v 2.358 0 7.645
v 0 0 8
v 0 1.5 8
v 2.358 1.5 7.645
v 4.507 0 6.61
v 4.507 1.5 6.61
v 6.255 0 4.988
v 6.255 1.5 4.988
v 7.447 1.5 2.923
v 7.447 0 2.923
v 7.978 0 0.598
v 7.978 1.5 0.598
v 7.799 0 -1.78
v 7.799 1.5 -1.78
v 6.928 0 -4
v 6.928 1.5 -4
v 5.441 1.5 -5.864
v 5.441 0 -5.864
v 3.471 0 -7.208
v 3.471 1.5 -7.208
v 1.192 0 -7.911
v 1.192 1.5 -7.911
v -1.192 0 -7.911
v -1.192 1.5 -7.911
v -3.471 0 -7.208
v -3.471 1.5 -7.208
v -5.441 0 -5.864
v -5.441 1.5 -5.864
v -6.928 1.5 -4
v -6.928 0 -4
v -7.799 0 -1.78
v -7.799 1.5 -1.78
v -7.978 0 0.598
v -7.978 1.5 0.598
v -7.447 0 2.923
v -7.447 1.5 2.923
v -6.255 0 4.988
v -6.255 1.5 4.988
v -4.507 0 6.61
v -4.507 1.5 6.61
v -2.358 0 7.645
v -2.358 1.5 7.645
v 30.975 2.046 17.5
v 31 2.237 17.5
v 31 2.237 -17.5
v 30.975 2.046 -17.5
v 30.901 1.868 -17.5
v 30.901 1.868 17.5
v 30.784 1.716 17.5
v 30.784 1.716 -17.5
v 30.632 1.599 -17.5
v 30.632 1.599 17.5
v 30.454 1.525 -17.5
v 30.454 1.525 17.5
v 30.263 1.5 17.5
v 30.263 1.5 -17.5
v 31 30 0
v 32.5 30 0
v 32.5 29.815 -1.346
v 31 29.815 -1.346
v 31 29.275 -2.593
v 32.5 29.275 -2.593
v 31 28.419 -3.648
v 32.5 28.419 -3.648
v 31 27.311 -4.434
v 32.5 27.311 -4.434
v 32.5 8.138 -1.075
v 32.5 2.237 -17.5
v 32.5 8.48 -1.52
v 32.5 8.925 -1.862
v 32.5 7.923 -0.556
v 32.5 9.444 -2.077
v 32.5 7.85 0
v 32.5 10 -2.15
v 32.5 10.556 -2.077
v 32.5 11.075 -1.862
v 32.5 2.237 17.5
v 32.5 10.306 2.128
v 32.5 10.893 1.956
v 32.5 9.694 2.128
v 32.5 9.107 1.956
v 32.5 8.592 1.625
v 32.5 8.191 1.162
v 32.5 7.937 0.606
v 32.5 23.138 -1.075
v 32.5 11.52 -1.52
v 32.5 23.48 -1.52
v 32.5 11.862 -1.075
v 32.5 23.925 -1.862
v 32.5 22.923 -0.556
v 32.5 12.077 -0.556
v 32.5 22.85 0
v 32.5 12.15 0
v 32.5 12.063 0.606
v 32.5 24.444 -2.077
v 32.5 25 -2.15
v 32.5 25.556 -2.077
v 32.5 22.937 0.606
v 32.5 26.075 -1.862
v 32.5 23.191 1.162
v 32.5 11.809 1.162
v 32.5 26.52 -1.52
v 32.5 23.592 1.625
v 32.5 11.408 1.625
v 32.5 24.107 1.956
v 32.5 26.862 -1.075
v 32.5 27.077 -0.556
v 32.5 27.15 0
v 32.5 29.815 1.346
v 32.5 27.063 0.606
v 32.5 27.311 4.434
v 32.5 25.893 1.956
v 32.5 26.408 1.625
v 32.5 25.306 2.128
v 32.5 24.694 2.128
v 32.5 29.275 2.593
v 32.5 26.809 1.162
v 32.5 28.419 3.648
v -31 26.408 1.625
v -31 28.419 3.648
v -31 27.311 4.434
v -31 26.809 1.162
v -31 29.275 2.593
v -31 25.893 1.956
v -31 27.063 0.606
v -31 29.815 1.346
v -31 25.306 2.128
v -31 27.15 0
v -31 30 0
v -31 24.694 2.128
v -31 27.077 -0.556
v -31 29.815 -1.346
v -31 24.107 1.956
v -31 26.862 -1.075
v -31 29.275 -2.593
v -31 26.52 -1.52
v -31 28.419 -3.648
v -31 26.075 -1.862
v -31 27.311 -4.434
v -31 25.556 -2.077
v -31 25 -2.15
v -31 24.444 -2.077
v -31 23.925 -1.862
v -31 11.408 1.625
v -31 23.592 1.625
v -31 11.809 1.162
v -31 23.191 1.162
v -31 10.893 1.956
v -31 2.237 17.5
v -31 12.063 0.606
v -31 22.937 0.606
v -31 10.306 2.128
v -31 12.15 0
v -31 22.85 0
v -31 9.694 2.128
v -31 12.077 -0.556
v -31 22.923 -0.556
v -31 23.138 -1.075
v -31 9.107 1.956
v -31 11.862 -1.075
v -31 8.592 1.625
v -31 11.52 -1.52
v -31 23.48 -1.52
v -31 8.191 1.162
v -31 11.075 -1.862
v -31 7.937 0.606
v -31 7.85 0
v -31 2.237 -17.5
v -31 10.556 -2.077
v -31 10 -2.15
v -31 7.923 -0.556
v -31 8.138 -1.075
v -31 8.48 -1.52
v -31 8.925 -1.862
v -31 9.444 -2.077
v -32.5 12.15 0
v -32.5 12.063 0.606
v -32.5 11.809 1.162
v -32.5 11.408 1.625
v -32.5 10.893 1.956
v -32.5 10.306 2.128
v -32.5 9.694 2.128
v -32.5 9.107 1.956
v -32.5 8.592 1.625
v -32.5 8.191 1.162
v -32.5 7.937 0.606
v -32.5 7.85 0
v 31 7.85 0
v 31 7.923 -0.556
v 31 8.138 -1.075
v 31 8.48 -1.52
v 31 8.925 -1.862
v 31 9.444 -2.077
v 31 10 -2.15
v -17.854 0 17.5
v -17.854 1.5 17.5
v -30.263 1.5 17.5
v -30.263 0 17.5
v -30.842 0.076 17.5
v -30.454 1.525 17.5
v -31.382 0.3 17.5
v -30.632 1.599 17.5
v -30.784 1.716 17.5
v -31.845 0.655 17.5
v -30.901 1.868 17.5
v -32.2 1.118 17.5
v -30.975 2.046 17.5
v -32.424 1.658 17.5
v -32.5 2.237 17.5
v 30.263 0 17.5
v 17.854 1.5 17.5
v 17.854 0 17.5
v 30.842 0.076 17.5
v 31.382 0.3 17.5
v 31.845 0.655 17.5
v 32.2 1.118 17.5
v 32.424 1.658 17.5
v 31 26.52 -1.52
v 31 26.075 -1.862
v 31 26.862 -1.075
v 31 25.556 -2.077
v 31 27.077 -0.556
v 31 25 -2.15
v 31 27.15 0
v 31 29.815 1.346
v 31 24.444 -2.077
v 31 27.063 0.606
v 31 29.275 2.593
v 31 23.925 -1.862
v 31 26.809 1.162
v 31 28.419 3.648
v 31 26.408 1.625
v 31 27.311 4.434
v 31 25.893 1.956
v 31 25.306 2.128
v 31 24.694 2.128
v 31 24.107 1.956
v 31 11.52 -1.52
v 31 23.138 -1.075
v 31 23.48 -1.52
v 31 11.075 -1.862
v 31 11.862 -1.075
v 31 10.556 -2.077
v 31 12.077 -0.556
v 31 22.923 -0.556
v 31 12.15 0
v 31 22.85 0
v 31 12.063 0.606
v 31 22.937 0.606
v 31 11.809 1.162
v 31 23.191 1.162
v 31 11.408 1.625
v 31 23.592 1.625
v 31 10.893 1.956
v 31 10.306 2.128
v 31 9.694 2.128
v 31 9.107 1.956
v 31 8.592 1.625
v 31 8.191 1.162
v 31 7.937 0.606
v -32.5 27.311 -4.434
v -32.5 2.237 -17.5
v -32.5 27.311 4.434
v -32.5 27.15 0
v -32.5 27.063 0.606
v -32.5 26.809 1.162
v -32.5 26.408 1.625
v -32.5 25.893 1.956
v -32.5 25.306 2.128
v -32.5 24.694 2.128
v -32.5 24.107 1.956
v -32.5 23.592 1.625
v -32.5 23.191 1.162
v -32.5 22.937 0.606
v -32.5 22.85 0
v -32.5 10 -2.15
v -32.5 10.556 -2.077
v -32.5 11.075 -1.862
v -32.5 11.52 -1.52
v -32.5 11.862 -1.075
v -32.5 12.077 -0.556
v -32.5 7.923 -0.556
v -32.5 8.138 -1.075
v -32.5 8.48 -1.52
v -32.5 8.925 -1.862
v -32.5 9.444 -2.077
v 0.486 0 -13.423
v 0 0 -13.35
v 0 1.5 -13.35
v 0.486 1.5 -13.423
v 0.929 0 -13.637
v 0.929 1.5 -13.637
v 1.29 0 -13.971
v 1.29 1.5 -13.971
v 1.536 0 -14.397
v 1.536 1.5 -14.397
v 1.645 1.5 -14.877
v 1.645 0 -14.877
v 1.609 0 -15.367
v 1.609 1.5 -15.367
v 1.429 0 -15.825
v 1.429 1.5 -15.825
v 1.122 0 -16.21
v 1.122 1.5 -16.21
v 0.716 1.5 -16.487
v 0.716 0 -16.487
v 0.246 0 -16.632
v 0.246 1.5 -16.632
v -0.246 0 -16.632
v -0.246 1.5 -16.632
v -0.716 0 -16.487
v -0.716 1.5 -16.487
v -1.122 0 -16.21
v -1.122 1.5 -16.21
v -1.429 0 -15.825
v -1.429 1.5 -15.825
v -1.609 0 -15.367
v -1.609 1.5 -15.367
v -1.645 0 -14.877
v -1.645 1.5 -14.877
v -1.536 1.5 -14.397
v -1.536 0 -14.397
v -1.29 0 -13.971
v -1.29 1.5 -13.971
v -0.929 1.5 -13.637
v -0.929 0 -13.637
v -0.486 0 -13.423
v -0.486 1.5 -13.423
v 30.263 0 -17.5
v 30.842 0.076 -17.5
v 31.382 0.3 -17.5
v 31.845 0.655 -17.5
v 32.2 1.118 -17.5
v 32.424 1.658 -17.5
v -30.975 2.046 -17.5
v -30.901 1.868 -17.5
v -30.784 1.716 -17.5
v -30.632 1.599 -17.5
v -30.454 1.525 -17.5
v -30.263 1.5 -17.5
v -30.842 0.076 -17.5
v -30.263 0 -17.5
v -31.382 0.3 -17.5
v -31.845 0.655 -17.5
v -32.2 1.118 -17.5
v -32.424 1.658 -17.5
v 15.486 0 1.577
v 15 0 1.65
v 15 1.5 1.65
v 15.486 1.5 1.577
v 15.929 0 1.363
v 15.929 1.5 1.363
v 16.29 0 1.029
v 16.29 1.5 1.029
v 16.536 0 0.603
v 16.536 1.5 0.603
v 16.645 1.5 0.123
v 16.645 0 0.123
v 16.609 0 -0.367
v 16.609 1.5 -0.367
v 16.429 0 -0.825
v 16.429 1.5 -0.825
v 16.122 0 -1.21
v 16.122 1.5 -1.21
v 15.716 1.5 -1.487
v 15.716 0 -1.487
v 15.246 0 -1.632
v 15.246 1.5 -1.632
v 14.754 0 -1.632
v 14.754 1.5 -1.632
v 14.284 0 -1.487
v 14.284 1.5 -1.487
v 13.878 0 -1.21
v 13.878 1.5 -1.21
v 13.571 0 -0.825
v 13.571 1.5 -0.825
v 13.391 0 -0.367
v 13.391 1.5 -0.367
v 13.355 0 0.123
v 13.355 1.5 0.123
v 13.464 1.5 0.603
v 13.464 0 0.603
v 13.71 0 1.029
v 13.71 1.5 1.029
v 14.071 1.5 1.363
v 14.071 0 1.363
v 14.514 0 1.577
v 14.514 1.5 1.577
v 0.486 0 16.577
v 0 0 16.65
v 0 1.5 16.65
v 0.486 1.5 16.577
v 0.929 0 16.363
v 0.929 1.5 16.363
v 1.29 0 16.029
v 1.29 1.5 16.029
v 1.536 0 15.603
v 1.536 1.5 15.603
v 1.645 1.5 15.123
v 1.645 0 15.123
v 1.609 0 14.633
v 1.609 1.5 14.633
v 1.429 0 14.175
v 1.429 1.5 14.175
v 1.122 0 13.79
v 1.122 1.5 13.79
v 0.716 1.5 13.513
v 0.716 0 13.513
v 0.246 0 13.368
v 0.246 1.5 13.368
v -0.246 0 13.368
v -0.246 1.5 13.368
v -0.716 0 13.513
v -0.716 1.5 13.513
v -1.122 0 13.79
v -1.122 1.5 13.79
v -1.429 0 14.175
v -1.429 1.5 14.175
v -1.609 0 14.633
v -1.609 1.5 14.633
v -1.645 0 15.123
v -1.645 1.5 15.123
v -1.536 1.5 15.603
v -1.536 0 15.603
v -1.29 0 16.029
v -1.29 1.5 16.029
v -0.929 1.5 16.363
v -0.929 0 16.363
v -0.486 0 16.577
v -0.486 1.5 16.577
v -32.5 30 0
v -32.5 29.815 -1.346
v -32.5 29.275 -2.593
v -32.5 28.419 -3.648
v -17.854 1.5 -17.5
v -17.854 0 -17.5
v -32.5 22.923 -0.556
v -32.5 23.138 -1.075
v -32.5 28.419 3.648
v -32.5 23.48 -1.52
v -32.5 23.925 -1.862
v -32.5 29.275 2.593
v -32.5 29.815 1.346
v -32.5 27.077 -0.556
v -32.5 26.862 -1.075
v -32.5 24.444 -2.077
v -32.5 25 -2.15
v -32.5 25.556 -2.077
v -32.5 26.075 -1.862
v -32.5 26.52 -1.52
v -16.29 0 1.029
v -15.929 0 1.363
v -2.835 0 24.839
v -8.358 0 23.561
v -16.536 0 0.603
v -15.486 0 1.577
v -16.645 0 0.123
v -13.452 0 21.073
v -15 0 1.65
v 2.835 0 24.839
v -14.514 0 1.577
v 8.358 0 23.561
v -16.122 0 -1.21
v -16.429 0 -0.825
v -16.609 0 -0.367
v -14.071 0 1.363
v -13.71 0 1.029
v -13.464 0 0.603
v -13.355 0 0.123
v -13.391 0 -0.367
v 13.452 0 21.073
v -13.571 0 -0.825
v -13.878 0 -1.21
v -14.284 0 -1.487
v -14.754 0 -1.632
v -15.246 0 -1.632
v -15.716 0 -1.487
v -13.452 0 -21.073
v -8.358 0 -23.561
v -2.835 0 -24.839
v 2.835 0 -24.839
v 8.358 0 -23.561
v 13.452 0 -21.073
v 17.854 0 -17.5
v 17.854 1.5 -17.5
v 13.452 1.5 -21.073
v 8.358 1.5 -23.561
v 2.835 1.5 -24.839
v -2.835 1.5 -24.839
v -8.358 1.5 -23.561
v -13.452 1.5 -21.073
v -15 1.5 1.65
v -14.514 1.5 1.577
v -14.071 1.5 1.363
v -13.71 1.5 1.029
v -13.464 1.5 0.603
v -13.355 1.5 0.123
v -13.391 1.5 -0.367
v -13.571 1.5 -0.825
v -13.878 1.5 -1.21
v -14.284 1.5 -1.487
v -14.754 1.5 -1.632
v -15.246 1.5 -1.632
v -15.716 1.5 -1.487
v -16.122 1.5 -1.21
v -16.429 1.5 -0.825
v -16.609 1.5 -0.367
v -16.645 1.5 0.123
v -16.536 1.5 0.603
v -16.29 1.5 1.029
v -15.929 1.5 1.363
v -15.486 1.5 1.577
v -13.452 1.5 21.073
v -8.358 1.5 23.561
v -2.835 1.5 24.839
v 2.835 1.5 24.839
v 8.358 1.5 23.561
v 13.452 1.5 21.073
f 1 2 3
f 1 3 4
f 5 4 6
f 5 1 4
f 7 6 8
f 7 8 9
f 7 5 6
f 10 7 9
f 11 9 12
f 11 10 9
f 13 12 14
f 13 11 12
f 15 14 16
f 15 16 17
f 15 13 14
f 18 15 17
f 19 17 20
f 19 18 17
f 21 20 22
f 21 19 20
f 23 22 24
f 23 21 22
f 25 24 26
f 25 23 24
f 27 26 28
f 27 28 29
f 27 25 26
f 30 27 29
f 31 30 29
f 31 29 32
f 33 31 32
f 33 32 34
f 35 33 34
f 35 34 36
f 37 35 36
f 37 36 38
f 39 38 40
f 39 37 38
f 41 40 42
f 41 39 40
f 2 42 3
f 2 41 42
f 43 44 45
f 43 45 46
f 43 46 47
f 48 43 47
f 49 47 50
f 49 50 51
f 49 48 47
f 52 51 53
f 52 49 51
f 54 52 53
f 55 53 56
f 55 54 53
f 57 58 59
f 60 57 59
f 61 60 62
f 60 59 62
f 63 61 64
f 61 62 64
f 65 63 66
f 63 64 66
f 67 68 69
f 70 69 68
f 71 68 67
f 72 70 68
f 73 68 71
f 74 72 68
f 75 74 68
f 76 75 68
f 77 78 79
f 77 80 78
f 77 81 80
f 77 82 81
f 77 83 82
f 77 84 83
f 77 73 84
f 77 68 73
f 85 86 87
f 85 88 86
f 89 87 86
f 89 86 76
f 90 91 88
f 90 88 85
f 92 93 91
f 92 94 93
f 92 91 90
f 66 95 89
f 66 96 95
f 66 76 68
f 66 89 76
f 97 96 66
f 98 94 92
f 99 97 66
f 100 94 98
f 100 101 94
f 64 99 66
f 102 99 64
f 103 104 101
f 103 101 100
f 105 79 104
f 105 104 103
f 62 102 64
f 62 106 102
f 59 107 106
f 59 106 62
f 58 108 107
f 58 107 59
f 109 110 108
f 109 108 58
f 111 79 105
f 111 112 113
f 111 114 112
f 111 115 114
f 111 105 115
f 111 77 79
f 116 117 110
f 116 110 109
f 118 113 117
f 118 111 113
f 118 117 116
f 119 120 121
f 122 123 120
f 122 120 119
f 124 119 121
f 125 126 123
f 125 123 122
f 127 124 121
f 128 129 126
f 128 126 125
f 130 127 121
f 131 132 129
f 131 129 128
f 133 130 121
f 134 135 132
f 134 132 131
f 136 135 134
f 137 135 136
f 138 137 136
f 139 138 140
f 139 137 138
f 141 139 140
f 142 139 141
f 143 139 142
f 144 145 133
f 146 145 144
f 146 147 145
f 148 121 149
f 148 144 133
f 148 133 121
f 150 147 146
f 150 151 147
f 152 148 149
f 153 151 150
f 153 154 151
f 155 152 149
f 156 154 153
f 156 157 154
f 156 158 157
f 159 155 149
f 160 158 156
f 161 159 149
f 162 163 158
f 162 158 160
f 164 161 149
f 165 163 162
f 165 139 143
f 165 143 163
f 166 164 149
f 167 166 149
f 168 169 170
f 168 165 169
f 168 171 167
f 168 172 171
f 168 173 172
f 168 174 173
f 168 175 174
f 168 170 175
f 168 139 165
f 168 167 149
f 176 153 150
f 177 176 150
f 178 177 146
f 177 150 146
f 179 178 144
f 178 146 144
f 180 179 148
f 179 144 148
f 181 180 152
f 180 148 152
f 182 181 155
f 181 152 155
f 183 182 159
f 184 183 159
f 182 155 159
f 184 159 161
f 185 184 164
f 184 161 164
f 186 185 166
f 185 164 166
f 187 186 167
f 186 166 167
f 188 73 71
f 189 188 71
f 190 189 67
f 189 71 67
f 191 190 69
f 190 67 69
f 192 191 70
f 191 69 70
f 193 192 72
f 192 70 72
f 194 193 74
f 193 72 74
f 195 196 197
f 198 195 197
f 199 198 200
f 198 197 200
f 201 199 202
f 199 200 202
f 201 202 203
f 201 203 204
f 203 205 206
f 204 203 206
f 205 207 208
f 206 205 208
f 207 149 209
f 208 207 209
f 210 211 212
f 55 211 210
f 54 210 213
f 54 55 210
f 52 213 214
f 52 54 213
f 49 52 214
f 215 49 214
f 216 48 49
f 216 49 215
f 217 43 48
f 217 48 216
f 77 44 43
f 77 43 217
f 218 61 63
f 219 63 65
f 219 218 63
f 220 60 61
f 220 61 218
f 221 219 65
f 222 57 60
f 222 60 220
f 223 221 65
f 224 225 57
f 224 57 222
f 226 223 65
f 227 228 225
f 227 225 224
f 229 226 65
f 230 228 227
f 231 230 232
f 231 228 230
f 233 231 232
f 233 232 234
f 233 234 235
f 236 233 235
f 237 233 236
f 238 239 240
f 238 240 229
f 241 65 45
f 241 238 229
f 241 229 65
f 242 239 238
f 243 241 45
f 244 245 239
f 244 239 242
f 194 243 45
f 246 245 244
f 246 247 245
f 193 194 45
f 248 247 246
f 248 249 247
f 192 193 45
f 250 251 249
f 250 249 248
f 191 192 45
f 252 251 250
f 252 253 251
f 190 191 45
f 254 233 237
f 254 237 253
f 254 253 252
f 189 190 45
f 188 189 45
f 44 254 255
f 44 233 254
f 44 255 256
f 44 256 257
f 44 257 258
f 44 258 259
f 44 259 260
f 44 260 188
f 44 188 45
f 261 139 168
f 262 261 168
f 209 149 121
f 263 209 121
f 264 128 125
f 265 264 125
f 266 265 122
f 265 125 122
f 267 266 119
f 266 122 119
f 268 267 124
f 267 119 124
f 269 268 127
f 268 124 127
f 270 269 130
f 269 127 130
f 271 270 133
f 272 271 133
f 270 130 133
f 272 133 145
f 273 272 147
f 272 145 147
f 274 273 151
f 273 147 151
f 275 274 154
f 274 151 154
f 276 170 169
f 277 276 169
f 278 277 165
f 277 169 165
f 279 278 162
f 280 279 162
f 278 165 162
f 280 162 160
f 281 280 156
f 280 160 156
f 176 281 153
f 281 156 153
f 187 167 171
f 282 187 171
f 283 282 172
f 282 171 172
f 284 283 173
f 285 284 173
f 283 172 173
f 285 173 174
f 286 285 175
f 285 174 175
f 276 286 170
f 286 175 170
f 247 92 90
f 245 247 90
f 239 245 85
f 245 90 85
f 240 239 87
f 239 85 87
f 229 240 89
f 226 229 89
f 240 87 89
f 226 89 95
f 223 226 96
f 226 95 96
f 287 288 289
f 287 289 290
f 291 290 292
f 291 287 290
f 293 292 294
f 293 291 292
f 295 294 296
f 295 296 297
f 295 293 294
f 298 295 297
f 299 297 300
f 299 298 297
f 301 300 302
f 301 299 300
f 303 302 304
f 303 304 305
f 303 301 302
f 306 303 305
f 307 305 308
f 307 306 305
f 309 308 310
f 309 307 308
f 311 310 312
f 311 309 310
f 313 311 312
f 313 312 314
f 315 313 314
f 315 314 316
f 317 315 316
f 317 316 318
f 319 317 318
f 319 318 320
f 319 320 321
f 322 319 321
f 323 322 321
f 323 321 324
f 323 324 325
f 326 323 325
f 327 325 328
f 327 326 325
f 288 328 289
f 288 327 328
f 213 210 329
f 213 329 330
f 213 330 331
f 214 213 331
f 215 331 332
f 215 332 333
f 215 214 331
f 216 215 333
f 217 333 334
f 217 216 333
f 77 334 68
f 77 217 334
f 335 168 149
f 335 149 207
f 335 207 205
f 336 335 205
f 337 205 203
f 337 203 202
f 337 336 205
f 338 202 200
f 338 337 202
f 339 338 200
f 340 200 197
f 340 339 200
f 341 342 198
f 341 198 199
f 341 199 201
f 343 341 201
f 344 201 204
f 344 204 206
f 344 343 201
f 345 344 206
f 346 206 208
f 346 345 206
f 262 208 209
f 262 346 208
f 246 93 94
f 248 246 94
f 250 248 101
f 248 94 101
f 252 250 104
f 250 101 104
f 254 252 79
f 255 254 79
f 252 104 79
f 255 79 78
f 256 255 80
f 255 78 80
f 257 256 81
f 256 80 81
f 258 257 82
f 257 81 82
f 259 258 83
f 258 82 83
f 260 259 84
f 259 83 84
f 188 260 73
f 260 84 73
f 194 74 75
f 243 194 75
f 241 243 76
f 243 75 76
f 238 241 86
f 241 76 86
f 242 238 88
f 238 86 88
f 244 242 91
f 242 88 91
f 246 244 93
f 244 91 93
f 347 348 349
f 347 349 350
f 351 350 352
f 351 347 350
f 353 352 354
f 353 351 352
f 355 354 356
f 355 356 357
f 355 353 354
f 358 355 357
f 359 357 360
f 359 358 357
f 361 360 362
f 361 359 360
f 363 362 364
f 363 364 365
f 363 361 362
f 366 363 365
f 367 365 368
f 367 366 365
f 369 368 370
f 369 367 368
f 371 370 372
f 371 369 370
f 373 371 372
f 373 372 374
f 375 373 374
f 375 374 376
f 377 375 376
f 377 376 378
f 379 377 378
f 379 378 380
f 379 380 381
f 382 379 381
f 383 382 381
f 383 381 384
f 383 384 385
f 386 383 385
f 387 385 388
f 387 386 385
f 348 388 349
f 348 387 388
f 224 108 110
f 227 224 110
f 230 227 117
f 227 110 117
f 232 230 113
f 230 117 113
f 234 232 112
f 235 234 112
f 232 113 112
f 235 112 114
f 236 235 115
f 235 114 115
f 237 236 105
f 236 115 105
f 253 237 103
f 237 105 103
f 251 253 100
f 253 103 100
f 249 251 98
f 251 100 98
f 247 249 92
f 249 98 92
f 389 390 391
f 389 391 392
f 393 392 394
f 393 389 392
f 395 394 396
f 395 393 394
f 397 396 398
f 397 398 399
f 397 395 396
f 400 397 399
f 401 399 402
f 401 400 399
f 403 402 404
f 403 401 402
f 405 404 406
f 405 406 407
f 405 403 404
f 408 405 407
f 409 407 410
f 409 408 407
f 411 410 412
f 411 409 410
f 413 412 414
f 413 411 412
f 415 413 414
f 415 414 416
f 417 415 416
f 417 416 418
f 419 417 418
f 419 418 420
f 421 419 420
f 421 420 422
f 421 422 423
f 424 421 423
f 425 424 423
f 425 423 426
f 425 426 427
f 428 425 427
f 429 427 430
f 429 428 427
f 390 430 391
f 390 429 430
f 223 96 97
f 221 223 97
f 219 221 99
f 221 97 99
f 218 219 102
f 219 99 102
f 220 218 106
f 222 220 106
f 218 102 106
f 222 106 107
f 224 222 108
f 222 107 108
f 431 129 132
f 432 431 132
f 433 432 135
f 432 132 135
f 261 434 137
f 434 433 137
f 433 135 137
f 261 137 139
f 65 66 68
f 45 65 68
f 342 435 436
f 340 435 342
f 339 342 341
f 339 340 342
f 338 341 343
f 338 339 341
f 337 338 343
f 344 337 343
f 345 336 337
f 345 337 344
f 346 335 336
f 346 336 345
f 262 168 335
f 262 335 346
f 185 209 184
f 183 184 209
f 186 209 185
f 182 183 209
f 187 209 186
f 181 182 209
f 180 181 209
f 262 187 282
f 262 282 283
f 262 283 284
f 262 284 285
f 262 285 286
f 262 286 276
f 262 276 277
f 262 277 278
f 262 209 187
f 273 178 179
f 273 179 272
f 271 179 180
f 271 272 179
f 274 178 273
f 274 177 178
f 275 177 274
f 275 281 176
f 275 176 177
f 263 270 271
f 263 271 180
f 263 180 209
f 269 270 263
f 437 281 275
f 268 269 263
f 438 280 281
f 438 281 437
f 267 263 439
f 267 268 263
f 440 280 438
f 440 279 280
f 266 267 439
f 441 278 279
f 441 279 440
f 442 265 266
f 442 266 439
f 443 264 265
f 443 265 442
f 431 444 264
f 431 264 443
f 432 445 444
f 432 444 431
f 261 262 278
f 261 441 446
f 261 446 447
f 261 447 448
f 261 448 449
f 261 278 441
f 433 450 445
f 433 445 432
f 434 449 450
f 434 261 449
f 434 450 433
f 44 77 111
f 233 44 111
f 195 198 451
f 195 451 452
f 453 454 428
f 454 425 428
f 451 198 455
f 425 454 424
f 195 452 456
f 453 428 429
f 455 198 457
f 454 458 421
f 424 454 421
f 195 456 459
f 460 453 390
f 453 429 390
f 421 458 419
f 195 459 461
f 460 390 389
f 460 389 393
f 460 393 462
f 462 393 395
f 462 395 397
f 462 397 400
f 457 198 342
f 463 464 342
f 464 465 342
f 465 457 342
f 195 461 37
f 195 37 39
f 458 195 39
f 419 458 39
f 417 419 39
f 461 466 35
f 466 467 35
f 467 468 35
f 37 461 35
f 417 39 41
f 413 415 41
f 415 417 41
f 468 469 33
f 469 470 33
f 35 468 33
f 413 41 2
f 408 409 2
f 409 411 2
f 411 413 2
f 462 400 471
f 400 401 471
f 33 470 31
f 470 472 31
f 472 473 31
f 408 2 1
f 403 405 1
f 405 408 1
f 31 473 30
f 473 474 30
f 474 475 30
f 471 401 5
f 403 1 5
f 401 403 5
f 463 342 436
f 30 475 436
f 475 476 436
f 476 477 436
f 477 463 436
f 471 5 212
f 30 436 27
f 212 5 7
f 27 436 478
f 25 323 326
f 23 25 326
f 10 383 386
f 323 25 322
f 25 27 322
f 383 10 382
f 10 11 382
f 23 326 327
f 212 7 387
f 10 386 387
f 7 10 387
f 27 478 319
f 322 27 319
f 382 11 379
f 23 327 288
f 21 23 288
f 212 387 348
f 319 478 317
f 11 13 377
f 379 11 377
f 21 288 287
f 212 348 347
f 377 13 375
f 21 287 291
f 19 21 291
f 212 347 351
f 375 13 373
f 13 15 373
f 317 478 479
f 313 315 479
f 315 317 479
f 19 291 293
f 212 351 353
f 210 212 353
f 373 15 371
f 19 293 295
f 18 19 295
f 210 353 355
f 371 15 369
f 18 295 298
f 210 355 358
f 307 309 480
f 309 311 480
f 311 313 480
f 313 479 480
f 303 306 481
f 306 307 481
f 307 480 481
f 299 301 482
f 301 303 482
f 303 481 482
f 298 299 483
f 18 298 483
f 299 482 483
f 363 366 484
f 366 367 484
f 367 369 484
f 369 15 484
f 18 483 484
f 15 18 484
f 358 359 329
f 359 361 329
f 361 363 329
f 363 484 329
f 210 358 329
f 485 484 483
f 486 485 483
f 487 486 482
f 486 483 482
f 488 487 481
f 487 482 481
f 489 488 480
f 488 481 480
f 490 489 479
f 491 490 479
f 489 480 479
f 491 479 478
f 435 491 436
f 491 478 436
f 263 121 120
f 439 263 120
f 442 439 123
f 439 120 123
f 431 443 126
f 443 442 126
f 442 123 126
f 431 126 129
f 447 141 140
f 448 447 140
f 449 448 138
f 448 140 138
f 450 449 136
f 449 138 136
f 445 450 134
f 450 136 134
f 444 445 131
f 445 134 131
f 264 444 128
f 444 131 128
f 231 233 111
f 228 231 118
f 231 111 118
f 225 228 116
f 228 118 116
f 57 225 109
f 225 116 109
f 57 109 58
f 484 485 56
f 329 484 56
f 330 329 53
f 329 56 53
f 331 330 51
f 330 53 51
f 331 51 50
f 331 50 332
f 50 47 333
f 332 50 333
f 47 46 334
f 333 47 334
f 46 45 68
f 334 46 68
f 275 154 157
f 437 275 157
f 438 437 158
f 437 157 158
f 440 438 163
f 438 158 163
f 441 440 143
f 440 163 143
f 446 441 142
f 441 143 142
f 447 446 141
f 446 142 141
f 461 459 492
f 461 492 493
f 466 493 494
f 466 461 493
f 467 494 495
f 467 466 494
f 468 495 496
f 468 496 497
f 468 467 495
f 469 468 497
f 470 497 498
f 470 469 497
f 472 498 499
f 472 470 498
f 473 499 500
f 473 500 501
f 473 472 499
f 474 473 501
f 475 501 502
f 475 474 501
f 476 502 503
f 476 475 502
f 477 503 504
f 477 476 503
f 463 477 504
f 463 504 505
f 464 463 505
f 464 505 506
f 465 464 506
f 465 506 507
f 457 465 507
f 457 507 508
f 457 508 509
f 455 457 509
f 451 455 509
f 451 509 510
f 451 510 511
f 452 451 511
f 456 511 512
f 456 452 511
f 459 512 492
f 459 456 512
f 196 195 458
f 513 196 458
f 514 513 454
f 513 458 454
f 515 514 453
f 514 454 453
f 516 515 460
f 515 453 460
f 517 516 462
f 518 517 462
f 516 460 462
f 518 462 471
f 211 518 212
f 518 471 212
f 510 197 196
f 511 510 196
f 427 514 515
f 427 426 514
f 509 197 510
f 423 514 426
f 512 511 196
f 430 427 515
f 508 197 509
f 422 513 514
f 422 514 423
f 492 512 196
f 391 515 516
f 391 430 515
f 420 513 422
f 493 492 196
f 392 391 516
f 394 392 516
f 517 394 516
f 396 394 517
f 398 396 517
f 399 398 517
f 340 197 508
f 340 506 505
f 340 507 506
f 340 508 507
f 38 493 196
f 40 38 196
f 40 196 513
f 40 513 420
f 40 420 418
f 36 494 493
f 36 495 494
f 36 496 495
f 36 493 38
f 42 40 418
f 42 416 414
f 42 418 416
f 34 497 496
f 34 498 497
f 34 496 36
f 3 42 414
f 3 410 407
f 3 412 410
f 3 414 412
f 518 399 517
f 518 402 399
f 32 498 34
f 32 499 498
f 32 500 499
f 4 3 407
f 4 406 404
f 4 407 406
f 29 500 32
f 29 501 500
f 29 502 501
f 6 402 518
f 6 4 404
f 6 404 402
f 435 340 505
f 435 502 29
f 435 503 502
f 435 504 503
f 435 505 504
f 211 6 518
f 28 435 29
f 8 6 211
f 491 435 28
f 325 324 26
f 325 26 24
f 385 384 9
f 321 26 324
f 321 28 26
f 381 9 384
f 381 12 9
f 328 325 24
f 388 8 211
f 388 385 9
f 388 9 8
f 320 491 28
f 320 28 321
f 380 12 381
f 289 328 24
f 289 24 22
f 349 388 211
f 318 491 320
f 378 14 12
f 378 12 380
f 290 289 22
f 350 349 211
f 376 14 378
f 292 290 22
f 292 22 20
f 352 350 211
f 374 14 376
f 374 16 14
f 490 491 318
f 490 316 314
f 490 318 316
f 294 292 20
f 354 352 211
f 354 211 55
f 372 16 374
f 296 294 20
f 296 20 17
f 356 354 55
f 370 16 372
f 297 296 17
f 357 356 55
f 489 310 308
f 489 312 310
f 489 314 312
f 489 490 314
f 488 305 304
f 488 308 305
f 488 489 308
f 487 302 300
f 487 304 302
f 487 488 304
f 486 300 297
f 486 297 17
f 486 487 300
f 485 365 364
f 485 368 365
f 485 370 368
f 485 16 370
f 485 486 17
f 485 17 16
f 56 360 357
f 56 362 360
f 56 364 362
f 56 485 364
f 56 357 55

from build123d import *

# Parameters (mm, degrees)
SKETCH_6_R                         = 8
SKETCH_6_R_2                       = 1.65
SM_BASE_FLANGE_2_DEPTH             = 1.5
SM_EDGE_FLANGE_1_STRIP_W           = 7.4732
SM_EDGE_FLANGE_1_STRIP_H           = 1.5
SM_EDGE_FLANGE_1_STRIP_CUT_DEPTH   = 35
SM_EDGE_FLANGE_1_STRIP_2_W         = 7.4732
SM_EDGE_FLANGE_1_STRIP_2_H         = 1.5
SM_EDGE_FLANGE_1_STRIP_CUT_2_DEPTH = 35
SM_EDGE_FLANGE_1_DEPTH             = 35
SM_EDGE_FLANGE_1_BEND_DEPTH        = 35
CUT_EXTRUDE_1_DEPTH                = 76.828754441


# Sheet-metal steps are written as plain solids
with BuildPart() as part:
    # 草图6 → 基体-法兰2 (new body)
    with BuildSketch(Plane(origin=(0, 0, 0), x_dir=(1, 0, 0), z_dir=(0, 1, 0))):
        with BuildLine():
            Line((17.853571071, -17.5), (32.5, -17.5))
            Line((32.5, -17.5), (32.5, 17.5))
            Line((32.5, 17.5), (17.853571071, 17.5))
            ThreePointArc((17.853571071, 17.5), (0, 25), (-17.853571071, 17.5))
            Line((-17.853571071, 17.5), (-32.5, 17.5))
            Line((-32.5, 17.5), (-32.5, -17.5))
            Line((-32.5, -17.5), (-17.853571071, -17.5))
            ThreePointArc((-17.853571071, -17.5), (0, -25), (17.853571071, -17.5))
        make_face()
        with Locations(Location((0, 0, 0), (0, 0, 270))):
            Circle(SKETCH_6_R, mode=Mode.SUBTRACT)
        with Locations(Location((0, 15, 0), (0, 0, 270))):
            Circle(SKETCH_6_R_2, mode=Mode.SUBTRACT)
        with Locations(Location((-15, 0, 0), (0, 0, 270))):
            Circle(SKETCH_6_R_2, mode=Mode.SUBTRACT)
        with Locations(Location((0, -15, 0), (0, 0, 270))):
            Circle(SKETCH_6_R_2, mode=Mode.SUBTRACT)
        with Locations(Location((15, 0, 0), (0, 0, 270))):
            Circle(SKETCH_6_R_2, mode=Mode.SUBTRACT)
    extrude(amount=SM_BASE_FLANGE_2_DEPTH)

    # 边线-法兰1 strip (across the edge) → 边线-法兰1 strip cut (cut)
    with BuildSketch(Plane(origin=(-32.5, 1.5, -17.5), x_dir=(1, 0, 0), z_dir=(0, 0, 1))):
        with Locations((-1.5, -0.75)):
            Rectangle(SM_EDGE_FLANGE_1_STRIP_W, SM_EDGE_FLANGE_1_STRIP_H)
    extrude(amount=SM_EDGE_FLANGE_1_STRIP_CUT_DEPTH, mode=Mode.SUBTRACT)

    # 边线-法兰1 strip 2 (across the edge) → 边线-法兰1 strip cut 2 (cut)
    with BuildSketch(Plane(origin=(32.5, 1.5, 17.5), x_dir=(-1, 0, 0), z_dir=(0, 0, -1))):
        with Locations((-1.5, -0.75)):
            Rectangle(SM_EDGE_FLANGE_1_STRIP_2_W, SM_EDGE_FLANGE_1_STRIP_2_H)
    extrude(amount=SM_EDGE_FLANGE_1_STRIP_CUT_2_DEPTH, mode=Mode.SUBTRACT)

    # 边线-法兰1 section (across the edge) → 边线-法兰1 (add)
    with BuildSketch(Plane(origin=(-32.5, 1.5, -17.5), x_dir=(1, 0, 0), z_dir=(0, 0, 1))):
        with BuildLine():
            Line((0, 0.7366), (0, 28.5))
            Line((0, 28.5), (1.5, 28.5))
            Line((1.5, 28.5), (1.5, 0.7366))
            ThreePointArc((1.5, 0.7366), (1.715745145, 0.215745145), (2.2366, 0))
            Line((2.2366, 0), (2.2366, -1.5))
            ThreePointArc((2.2366, -1.5), (0.655084973, -0.844915027), (0, 0.7366))
        make_face()
    extrude(amount=SM_EDGE_FLANGE_1_DEPTH)

    # 边线-法兰1 section 2 (across the edge) → 边线-法兰1 bend (add)
    with BuildSketch(Plane(origin=(32.5, 1.5, 17.5), x_dir=(-1, 0, 0), z_dir=(0, 0, -1))):
        with BuildLine():
            Line((0, 0.7366), (0, 28.5))
            Line((0, 28.5), (1.5, 28.5))
            Line((1.5, 28.5), (1.5, 0.7366))
            ThreePointArc((1.5, 0.7366), (1.715745145, 0.215745145), (2.2366, 0))
            Line((2.2366, 0), (2.2366, -1.5))
            ThreePointArc((2.2366, -1.5), (0.655084973, -0.844915027), (0, 0.7366))
        make_face()
    extrude(amount=SM_EDGE_FLANGE_1_BEND_DEPTH)

    # 草图18 → 切除-拉伸1 (cut, through all)
    with BuildSketch(Plane(origin=(32.5, 0, 0), x_dir=(0, 0, -1), z_dir=(1, 0, 0))):
        with BuildLine():
            Line((-17.5, 30), (-17.5, 2.2366))
            Line((-17.5, 2.2366), (-4.434096645, 27.310581516))
            ThreePointArc((-4.434096645, 27.310581516), (-2.592980179, 29.275096933), (0, 30))
            Line((0, 30), (-17.5, 30))
        make_face()
        with BuildLine():
            Line((17.5, 30), (0, 30))
            ThreePointArc((0, 30), (2.592980179, 29.275096933), (4.434096645, 27.310581516))
            Line((4.434096645, 27.310581516), (17.5, 2.2366))
            Line((17.5, 2.2366), (17.5, 30))
        make_face()
        with BuildLine():
            ThreePointArc((2.15, 25), (1.52027958, 26.52027958), (0, 27.15))
            Line((0, 27.15), (0, 22.85))
            ThreePointArc((0, 22.85), (1.52027958, 23.47972042), (2.15, 25))
        make_face()
        with BuildLine():
            Line((0, 22.85), (0, 27.15))
            ThreePointArc((0, 27.15), (-2.15, 25), (0, 22.85))
        make_face()
        with BuildLine():
            ThreePointArc((2.15, 10), (1.52027958, 11.52027958), (0, 12.15))
            Line((0, 12.15), (0, 7.85))
            ThreePointArc((0, 7.85), (1.52027958, 8.47972042), (2.15, 10))
        make_face()
        with BuildLine():
            Line((0, 7.85), (0, 12.15))
            ThreePointArc((0, 12.15), (-2.15, 10), (0, 7.85))
        make_face()
    extrude(amount=-CUT_EXTRUDE_1_DEPTH, mode=Mode.SUBTRACT)


solid = part.part
